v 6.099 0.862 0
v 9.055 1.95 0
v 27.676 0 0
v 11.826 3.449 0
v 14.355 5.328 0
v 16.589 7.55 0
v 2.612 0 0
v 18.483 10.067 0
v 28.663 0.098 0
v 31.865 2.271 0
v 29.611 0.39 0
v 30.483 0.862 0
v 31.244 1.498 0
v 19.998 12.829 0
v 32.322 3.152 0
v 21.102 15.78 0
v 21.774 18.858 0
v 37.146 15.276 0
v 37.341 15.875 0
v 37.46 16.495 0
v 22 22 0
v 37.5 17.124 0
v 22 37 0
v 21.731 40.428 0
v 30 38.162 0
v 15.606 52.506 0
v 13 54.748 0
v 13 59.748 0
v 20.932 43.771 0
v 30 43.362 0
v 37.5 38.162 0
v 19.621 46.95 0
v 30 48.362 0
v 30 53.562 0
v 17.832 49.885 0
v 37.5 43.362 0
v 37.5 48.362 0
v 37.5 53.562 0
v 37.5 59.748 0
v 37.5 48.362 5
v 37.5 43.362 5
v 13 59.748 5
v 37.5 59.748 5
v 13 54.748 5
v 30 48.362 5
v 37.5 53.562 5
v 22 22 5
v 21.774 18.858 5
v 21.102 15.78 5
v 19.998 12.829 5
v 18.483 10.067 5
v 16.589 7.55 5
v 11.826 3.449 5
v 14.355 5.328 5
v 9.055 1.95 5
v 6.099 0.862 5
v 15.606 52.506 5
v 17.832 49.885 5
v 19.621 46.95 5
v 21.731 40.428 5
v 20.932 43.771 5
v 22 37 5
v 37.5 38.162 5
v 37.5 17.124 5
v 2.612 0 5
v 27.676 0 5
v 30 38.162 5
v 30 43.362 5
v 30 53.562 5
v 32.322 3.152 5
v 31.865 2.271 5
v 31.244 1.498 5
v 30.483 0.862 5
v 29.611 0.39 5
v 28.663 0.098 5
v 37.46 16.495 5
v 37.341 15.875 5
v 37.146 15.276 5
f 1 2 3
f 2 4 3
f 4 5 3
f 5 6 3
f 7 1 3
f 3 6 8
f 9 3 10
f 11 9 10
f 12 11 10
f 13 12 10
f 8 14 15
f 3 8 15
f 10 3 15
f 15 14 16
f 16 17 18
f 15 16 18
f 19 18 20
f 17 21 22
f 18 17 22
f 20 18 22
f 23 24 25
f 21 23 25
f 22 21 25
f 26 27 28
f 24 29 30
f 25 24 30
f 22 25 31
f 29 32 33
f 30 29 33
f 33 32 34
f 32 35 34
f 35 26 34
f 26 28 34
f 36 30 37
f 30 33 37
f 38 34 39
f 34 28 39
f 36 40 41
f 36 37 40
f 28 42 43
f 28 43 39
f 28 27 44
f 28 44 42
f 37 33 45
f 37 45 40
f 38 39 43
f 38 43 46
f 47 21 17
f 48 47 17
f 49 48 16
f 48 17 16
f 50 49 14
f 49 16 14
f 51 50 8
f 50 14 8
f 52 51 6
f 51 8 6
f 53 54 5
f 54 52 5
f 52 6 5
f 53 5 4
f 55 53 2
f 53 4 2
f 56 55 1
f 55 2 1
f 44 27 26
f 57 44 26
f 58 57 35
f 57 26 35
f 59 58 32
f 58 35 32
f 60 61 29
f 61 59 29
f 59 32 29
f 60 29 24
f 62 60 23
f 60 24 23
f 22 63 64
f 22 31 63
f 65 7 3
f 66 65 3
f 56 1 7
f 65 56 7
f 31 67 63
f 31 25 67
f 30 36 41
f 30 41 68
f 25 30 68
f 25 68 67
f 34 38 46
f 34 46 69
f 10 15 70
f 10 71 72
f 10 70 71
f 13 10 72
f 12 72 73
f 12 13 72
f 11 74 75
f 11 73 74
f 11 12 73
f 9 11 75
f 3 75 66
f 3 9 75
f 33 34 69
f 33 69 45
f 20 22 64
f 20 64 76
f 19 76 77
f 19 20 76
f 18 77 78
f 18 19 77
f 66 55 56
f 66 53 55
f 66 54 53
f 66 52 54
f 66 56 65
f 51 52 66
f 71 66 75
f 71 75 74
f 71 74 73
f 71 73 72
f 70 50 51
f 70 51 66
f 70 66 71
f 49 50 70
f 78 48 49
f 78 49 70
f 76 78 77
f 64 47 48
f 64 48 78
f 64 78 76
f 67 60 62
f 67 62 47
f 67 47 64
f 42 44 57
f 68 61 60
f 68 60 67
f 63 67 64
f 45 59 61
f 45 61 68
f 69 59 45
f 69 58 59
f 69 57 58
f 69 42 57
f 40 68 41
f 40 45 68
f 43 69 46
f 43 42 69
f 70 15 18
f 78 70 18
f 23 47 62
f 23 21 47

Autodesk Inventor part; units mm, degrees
ref_plane "YZ Plane" through (0, 0, 0) normal (1, 0, 0) x (0, 1, 0)
ref_plane "XZ Plane" through (0, 0, 0) normal (0, 1, 0) x (-1, 0, 0)
ref_plane "XY Plane" through (0, 0, 0) normal (0, 0, 1) x (1, 0, 0)
sketch "Sketch1" plane through (0, 0, 0) normal (0, 0, 1) x (1, 0, 0)
  arc A0 (6.0987, 0.8622) -> (22, 22) centre (0, 22) ccw
  line L0 (22, 22) -> (22, 37)
  arc A1 (22, 37) -> (13, 54.7482) centre (0, 37) ccw
  line L1 (13, 54.7482) -> (13, 66.7482)
  line L2 (22.5, 90) -> (22.5, 66.7482)
  line L3 (22.5, 90) -> (37.5, 90)
  line L4 (13, 66.7482) -> (22.5, 66.7482)
  line L5 (2.6116, 0) -> (27.6759, 0)
  line L6 (32.3216, 3.1515) -> (37.1457, 15.2755)
  arc A2 (37.1457, 15.2755) -> (37.5, 17.1241) centre (32.5, 17.1241) ccw
  arc A3 (27.6759, 0) -> (32.3216, 3.1515) centre (27.6759, 5) ccw
  line L7 (37.5, 53.562) -> (30, 53.562)
  line L8 (30, 53.562) -> (30, 48.362)
  line L9 (30, 48.362) -> (37.5, 48.362)
  line L10 (37.5, 43.362) -> (30, 43.362)
  line L11 (30, 43.362) -> (30, 38.162)
  line L12 (30, 38.162) -> (37.5, 38.162)
  line L13 (37.5, 90) -> (37.5, 53.562)
  line L14 (37.5, 48.362) -> (37.5, 43.362)
  line L15 (37.5, 38.162) -> (37.5, 17.1241)
  line L16 (6.0987, 0.8622) -> (2.6116, 0)
  point P0 (0, 0)
  dimension "d0" = 22
  dimension "d1" = 90
  dimension "d2" = 0
  dimension "d3" = 15
  dimension "d4" = 0
  dimension "d5" = 13
  dimension "d6" = 22
  dimension "d7" = 12
  dimension "d8" = 22.5
  dimension "d10" = 90
  dimension "d11" = 37
  dimension "d12" = 5
  dimension "d13" = 12.1241
  dimension "d14" = 5.2
  dimension "d15" = 5.2
  dimension "d16" = 5
sketch "Sketch2" plane through (0, 0, 0) normal (0, 0, 1) x (1, 0, 0)
  point P0 (0, 0)
extrude "Extrusion1" add sketch "Sketch1" along normal blind 5
sketch "Sketch3" plane through (0, 0, 5) normal (0, 0, 1) x (1, 0, 0)
  line L0 (22.5, 90) -> (22.5, 66.7482) projected
  line L1 (37.5, 90) -> (22.5, 90) projected
  point P0 (0, 0)
  point P1 (30, 86.5)
  point P2 (30, 68.5)
  dimension "d20" = 18
  dimension "d21" = 7.5
  dimension "d22" = 7.5
  dimension "d23" = 3.5
hole "Hole1" at (30, 86.5, 5) at (30, 68.5, 5) direction (0, 0, -1) diameter 3.4 end through all
sketch "Sketch4" plane through (22.5, 66.7482, 0) normal (-1, 0, 0) x (0, 0, 1)
  line L0 (-7.9102, 0) -> (13.3435, 0)
  line L1 (13.3435, 0) -> (13.3435, 24.2425)
  line L2 (13.3435, 24.2425) -> (-7.9102, 24.2425)
  line L3 (-7.9102, 24.2425) -> (-7.9102, 0)
  line L4 (0, 0) -> (5, 0) projected
  point P0 (0, -66.7482)
  dimension "d31" = 0
extrude "Extrusion2" cut sketch "Sketch4" against normal blind 15
sketch "Sketch5" plane through (13, 54.7482, 0) normal (-1, 0, 0) x (0, 0, 1)
  line L0 (-8.9151, 14.3214) -> (15.4889, 14.3214)
  line L1 (15.4889, 14.3214) -> (15.4889, 5)
  line L2 (15.4889, 5) -> (-8.9151, 5)
  line L3 (-8.9151, 5) -> (-8.9151, 14.3214)
  line L4 (0, 12) -> (5, 12) projected
  point P0 (0, -54.7482)
  dimension "d34" = 7
extrude "Extrusion3" cut sketch "Sketch5" against normal blind 40
properties part number "Finger"
